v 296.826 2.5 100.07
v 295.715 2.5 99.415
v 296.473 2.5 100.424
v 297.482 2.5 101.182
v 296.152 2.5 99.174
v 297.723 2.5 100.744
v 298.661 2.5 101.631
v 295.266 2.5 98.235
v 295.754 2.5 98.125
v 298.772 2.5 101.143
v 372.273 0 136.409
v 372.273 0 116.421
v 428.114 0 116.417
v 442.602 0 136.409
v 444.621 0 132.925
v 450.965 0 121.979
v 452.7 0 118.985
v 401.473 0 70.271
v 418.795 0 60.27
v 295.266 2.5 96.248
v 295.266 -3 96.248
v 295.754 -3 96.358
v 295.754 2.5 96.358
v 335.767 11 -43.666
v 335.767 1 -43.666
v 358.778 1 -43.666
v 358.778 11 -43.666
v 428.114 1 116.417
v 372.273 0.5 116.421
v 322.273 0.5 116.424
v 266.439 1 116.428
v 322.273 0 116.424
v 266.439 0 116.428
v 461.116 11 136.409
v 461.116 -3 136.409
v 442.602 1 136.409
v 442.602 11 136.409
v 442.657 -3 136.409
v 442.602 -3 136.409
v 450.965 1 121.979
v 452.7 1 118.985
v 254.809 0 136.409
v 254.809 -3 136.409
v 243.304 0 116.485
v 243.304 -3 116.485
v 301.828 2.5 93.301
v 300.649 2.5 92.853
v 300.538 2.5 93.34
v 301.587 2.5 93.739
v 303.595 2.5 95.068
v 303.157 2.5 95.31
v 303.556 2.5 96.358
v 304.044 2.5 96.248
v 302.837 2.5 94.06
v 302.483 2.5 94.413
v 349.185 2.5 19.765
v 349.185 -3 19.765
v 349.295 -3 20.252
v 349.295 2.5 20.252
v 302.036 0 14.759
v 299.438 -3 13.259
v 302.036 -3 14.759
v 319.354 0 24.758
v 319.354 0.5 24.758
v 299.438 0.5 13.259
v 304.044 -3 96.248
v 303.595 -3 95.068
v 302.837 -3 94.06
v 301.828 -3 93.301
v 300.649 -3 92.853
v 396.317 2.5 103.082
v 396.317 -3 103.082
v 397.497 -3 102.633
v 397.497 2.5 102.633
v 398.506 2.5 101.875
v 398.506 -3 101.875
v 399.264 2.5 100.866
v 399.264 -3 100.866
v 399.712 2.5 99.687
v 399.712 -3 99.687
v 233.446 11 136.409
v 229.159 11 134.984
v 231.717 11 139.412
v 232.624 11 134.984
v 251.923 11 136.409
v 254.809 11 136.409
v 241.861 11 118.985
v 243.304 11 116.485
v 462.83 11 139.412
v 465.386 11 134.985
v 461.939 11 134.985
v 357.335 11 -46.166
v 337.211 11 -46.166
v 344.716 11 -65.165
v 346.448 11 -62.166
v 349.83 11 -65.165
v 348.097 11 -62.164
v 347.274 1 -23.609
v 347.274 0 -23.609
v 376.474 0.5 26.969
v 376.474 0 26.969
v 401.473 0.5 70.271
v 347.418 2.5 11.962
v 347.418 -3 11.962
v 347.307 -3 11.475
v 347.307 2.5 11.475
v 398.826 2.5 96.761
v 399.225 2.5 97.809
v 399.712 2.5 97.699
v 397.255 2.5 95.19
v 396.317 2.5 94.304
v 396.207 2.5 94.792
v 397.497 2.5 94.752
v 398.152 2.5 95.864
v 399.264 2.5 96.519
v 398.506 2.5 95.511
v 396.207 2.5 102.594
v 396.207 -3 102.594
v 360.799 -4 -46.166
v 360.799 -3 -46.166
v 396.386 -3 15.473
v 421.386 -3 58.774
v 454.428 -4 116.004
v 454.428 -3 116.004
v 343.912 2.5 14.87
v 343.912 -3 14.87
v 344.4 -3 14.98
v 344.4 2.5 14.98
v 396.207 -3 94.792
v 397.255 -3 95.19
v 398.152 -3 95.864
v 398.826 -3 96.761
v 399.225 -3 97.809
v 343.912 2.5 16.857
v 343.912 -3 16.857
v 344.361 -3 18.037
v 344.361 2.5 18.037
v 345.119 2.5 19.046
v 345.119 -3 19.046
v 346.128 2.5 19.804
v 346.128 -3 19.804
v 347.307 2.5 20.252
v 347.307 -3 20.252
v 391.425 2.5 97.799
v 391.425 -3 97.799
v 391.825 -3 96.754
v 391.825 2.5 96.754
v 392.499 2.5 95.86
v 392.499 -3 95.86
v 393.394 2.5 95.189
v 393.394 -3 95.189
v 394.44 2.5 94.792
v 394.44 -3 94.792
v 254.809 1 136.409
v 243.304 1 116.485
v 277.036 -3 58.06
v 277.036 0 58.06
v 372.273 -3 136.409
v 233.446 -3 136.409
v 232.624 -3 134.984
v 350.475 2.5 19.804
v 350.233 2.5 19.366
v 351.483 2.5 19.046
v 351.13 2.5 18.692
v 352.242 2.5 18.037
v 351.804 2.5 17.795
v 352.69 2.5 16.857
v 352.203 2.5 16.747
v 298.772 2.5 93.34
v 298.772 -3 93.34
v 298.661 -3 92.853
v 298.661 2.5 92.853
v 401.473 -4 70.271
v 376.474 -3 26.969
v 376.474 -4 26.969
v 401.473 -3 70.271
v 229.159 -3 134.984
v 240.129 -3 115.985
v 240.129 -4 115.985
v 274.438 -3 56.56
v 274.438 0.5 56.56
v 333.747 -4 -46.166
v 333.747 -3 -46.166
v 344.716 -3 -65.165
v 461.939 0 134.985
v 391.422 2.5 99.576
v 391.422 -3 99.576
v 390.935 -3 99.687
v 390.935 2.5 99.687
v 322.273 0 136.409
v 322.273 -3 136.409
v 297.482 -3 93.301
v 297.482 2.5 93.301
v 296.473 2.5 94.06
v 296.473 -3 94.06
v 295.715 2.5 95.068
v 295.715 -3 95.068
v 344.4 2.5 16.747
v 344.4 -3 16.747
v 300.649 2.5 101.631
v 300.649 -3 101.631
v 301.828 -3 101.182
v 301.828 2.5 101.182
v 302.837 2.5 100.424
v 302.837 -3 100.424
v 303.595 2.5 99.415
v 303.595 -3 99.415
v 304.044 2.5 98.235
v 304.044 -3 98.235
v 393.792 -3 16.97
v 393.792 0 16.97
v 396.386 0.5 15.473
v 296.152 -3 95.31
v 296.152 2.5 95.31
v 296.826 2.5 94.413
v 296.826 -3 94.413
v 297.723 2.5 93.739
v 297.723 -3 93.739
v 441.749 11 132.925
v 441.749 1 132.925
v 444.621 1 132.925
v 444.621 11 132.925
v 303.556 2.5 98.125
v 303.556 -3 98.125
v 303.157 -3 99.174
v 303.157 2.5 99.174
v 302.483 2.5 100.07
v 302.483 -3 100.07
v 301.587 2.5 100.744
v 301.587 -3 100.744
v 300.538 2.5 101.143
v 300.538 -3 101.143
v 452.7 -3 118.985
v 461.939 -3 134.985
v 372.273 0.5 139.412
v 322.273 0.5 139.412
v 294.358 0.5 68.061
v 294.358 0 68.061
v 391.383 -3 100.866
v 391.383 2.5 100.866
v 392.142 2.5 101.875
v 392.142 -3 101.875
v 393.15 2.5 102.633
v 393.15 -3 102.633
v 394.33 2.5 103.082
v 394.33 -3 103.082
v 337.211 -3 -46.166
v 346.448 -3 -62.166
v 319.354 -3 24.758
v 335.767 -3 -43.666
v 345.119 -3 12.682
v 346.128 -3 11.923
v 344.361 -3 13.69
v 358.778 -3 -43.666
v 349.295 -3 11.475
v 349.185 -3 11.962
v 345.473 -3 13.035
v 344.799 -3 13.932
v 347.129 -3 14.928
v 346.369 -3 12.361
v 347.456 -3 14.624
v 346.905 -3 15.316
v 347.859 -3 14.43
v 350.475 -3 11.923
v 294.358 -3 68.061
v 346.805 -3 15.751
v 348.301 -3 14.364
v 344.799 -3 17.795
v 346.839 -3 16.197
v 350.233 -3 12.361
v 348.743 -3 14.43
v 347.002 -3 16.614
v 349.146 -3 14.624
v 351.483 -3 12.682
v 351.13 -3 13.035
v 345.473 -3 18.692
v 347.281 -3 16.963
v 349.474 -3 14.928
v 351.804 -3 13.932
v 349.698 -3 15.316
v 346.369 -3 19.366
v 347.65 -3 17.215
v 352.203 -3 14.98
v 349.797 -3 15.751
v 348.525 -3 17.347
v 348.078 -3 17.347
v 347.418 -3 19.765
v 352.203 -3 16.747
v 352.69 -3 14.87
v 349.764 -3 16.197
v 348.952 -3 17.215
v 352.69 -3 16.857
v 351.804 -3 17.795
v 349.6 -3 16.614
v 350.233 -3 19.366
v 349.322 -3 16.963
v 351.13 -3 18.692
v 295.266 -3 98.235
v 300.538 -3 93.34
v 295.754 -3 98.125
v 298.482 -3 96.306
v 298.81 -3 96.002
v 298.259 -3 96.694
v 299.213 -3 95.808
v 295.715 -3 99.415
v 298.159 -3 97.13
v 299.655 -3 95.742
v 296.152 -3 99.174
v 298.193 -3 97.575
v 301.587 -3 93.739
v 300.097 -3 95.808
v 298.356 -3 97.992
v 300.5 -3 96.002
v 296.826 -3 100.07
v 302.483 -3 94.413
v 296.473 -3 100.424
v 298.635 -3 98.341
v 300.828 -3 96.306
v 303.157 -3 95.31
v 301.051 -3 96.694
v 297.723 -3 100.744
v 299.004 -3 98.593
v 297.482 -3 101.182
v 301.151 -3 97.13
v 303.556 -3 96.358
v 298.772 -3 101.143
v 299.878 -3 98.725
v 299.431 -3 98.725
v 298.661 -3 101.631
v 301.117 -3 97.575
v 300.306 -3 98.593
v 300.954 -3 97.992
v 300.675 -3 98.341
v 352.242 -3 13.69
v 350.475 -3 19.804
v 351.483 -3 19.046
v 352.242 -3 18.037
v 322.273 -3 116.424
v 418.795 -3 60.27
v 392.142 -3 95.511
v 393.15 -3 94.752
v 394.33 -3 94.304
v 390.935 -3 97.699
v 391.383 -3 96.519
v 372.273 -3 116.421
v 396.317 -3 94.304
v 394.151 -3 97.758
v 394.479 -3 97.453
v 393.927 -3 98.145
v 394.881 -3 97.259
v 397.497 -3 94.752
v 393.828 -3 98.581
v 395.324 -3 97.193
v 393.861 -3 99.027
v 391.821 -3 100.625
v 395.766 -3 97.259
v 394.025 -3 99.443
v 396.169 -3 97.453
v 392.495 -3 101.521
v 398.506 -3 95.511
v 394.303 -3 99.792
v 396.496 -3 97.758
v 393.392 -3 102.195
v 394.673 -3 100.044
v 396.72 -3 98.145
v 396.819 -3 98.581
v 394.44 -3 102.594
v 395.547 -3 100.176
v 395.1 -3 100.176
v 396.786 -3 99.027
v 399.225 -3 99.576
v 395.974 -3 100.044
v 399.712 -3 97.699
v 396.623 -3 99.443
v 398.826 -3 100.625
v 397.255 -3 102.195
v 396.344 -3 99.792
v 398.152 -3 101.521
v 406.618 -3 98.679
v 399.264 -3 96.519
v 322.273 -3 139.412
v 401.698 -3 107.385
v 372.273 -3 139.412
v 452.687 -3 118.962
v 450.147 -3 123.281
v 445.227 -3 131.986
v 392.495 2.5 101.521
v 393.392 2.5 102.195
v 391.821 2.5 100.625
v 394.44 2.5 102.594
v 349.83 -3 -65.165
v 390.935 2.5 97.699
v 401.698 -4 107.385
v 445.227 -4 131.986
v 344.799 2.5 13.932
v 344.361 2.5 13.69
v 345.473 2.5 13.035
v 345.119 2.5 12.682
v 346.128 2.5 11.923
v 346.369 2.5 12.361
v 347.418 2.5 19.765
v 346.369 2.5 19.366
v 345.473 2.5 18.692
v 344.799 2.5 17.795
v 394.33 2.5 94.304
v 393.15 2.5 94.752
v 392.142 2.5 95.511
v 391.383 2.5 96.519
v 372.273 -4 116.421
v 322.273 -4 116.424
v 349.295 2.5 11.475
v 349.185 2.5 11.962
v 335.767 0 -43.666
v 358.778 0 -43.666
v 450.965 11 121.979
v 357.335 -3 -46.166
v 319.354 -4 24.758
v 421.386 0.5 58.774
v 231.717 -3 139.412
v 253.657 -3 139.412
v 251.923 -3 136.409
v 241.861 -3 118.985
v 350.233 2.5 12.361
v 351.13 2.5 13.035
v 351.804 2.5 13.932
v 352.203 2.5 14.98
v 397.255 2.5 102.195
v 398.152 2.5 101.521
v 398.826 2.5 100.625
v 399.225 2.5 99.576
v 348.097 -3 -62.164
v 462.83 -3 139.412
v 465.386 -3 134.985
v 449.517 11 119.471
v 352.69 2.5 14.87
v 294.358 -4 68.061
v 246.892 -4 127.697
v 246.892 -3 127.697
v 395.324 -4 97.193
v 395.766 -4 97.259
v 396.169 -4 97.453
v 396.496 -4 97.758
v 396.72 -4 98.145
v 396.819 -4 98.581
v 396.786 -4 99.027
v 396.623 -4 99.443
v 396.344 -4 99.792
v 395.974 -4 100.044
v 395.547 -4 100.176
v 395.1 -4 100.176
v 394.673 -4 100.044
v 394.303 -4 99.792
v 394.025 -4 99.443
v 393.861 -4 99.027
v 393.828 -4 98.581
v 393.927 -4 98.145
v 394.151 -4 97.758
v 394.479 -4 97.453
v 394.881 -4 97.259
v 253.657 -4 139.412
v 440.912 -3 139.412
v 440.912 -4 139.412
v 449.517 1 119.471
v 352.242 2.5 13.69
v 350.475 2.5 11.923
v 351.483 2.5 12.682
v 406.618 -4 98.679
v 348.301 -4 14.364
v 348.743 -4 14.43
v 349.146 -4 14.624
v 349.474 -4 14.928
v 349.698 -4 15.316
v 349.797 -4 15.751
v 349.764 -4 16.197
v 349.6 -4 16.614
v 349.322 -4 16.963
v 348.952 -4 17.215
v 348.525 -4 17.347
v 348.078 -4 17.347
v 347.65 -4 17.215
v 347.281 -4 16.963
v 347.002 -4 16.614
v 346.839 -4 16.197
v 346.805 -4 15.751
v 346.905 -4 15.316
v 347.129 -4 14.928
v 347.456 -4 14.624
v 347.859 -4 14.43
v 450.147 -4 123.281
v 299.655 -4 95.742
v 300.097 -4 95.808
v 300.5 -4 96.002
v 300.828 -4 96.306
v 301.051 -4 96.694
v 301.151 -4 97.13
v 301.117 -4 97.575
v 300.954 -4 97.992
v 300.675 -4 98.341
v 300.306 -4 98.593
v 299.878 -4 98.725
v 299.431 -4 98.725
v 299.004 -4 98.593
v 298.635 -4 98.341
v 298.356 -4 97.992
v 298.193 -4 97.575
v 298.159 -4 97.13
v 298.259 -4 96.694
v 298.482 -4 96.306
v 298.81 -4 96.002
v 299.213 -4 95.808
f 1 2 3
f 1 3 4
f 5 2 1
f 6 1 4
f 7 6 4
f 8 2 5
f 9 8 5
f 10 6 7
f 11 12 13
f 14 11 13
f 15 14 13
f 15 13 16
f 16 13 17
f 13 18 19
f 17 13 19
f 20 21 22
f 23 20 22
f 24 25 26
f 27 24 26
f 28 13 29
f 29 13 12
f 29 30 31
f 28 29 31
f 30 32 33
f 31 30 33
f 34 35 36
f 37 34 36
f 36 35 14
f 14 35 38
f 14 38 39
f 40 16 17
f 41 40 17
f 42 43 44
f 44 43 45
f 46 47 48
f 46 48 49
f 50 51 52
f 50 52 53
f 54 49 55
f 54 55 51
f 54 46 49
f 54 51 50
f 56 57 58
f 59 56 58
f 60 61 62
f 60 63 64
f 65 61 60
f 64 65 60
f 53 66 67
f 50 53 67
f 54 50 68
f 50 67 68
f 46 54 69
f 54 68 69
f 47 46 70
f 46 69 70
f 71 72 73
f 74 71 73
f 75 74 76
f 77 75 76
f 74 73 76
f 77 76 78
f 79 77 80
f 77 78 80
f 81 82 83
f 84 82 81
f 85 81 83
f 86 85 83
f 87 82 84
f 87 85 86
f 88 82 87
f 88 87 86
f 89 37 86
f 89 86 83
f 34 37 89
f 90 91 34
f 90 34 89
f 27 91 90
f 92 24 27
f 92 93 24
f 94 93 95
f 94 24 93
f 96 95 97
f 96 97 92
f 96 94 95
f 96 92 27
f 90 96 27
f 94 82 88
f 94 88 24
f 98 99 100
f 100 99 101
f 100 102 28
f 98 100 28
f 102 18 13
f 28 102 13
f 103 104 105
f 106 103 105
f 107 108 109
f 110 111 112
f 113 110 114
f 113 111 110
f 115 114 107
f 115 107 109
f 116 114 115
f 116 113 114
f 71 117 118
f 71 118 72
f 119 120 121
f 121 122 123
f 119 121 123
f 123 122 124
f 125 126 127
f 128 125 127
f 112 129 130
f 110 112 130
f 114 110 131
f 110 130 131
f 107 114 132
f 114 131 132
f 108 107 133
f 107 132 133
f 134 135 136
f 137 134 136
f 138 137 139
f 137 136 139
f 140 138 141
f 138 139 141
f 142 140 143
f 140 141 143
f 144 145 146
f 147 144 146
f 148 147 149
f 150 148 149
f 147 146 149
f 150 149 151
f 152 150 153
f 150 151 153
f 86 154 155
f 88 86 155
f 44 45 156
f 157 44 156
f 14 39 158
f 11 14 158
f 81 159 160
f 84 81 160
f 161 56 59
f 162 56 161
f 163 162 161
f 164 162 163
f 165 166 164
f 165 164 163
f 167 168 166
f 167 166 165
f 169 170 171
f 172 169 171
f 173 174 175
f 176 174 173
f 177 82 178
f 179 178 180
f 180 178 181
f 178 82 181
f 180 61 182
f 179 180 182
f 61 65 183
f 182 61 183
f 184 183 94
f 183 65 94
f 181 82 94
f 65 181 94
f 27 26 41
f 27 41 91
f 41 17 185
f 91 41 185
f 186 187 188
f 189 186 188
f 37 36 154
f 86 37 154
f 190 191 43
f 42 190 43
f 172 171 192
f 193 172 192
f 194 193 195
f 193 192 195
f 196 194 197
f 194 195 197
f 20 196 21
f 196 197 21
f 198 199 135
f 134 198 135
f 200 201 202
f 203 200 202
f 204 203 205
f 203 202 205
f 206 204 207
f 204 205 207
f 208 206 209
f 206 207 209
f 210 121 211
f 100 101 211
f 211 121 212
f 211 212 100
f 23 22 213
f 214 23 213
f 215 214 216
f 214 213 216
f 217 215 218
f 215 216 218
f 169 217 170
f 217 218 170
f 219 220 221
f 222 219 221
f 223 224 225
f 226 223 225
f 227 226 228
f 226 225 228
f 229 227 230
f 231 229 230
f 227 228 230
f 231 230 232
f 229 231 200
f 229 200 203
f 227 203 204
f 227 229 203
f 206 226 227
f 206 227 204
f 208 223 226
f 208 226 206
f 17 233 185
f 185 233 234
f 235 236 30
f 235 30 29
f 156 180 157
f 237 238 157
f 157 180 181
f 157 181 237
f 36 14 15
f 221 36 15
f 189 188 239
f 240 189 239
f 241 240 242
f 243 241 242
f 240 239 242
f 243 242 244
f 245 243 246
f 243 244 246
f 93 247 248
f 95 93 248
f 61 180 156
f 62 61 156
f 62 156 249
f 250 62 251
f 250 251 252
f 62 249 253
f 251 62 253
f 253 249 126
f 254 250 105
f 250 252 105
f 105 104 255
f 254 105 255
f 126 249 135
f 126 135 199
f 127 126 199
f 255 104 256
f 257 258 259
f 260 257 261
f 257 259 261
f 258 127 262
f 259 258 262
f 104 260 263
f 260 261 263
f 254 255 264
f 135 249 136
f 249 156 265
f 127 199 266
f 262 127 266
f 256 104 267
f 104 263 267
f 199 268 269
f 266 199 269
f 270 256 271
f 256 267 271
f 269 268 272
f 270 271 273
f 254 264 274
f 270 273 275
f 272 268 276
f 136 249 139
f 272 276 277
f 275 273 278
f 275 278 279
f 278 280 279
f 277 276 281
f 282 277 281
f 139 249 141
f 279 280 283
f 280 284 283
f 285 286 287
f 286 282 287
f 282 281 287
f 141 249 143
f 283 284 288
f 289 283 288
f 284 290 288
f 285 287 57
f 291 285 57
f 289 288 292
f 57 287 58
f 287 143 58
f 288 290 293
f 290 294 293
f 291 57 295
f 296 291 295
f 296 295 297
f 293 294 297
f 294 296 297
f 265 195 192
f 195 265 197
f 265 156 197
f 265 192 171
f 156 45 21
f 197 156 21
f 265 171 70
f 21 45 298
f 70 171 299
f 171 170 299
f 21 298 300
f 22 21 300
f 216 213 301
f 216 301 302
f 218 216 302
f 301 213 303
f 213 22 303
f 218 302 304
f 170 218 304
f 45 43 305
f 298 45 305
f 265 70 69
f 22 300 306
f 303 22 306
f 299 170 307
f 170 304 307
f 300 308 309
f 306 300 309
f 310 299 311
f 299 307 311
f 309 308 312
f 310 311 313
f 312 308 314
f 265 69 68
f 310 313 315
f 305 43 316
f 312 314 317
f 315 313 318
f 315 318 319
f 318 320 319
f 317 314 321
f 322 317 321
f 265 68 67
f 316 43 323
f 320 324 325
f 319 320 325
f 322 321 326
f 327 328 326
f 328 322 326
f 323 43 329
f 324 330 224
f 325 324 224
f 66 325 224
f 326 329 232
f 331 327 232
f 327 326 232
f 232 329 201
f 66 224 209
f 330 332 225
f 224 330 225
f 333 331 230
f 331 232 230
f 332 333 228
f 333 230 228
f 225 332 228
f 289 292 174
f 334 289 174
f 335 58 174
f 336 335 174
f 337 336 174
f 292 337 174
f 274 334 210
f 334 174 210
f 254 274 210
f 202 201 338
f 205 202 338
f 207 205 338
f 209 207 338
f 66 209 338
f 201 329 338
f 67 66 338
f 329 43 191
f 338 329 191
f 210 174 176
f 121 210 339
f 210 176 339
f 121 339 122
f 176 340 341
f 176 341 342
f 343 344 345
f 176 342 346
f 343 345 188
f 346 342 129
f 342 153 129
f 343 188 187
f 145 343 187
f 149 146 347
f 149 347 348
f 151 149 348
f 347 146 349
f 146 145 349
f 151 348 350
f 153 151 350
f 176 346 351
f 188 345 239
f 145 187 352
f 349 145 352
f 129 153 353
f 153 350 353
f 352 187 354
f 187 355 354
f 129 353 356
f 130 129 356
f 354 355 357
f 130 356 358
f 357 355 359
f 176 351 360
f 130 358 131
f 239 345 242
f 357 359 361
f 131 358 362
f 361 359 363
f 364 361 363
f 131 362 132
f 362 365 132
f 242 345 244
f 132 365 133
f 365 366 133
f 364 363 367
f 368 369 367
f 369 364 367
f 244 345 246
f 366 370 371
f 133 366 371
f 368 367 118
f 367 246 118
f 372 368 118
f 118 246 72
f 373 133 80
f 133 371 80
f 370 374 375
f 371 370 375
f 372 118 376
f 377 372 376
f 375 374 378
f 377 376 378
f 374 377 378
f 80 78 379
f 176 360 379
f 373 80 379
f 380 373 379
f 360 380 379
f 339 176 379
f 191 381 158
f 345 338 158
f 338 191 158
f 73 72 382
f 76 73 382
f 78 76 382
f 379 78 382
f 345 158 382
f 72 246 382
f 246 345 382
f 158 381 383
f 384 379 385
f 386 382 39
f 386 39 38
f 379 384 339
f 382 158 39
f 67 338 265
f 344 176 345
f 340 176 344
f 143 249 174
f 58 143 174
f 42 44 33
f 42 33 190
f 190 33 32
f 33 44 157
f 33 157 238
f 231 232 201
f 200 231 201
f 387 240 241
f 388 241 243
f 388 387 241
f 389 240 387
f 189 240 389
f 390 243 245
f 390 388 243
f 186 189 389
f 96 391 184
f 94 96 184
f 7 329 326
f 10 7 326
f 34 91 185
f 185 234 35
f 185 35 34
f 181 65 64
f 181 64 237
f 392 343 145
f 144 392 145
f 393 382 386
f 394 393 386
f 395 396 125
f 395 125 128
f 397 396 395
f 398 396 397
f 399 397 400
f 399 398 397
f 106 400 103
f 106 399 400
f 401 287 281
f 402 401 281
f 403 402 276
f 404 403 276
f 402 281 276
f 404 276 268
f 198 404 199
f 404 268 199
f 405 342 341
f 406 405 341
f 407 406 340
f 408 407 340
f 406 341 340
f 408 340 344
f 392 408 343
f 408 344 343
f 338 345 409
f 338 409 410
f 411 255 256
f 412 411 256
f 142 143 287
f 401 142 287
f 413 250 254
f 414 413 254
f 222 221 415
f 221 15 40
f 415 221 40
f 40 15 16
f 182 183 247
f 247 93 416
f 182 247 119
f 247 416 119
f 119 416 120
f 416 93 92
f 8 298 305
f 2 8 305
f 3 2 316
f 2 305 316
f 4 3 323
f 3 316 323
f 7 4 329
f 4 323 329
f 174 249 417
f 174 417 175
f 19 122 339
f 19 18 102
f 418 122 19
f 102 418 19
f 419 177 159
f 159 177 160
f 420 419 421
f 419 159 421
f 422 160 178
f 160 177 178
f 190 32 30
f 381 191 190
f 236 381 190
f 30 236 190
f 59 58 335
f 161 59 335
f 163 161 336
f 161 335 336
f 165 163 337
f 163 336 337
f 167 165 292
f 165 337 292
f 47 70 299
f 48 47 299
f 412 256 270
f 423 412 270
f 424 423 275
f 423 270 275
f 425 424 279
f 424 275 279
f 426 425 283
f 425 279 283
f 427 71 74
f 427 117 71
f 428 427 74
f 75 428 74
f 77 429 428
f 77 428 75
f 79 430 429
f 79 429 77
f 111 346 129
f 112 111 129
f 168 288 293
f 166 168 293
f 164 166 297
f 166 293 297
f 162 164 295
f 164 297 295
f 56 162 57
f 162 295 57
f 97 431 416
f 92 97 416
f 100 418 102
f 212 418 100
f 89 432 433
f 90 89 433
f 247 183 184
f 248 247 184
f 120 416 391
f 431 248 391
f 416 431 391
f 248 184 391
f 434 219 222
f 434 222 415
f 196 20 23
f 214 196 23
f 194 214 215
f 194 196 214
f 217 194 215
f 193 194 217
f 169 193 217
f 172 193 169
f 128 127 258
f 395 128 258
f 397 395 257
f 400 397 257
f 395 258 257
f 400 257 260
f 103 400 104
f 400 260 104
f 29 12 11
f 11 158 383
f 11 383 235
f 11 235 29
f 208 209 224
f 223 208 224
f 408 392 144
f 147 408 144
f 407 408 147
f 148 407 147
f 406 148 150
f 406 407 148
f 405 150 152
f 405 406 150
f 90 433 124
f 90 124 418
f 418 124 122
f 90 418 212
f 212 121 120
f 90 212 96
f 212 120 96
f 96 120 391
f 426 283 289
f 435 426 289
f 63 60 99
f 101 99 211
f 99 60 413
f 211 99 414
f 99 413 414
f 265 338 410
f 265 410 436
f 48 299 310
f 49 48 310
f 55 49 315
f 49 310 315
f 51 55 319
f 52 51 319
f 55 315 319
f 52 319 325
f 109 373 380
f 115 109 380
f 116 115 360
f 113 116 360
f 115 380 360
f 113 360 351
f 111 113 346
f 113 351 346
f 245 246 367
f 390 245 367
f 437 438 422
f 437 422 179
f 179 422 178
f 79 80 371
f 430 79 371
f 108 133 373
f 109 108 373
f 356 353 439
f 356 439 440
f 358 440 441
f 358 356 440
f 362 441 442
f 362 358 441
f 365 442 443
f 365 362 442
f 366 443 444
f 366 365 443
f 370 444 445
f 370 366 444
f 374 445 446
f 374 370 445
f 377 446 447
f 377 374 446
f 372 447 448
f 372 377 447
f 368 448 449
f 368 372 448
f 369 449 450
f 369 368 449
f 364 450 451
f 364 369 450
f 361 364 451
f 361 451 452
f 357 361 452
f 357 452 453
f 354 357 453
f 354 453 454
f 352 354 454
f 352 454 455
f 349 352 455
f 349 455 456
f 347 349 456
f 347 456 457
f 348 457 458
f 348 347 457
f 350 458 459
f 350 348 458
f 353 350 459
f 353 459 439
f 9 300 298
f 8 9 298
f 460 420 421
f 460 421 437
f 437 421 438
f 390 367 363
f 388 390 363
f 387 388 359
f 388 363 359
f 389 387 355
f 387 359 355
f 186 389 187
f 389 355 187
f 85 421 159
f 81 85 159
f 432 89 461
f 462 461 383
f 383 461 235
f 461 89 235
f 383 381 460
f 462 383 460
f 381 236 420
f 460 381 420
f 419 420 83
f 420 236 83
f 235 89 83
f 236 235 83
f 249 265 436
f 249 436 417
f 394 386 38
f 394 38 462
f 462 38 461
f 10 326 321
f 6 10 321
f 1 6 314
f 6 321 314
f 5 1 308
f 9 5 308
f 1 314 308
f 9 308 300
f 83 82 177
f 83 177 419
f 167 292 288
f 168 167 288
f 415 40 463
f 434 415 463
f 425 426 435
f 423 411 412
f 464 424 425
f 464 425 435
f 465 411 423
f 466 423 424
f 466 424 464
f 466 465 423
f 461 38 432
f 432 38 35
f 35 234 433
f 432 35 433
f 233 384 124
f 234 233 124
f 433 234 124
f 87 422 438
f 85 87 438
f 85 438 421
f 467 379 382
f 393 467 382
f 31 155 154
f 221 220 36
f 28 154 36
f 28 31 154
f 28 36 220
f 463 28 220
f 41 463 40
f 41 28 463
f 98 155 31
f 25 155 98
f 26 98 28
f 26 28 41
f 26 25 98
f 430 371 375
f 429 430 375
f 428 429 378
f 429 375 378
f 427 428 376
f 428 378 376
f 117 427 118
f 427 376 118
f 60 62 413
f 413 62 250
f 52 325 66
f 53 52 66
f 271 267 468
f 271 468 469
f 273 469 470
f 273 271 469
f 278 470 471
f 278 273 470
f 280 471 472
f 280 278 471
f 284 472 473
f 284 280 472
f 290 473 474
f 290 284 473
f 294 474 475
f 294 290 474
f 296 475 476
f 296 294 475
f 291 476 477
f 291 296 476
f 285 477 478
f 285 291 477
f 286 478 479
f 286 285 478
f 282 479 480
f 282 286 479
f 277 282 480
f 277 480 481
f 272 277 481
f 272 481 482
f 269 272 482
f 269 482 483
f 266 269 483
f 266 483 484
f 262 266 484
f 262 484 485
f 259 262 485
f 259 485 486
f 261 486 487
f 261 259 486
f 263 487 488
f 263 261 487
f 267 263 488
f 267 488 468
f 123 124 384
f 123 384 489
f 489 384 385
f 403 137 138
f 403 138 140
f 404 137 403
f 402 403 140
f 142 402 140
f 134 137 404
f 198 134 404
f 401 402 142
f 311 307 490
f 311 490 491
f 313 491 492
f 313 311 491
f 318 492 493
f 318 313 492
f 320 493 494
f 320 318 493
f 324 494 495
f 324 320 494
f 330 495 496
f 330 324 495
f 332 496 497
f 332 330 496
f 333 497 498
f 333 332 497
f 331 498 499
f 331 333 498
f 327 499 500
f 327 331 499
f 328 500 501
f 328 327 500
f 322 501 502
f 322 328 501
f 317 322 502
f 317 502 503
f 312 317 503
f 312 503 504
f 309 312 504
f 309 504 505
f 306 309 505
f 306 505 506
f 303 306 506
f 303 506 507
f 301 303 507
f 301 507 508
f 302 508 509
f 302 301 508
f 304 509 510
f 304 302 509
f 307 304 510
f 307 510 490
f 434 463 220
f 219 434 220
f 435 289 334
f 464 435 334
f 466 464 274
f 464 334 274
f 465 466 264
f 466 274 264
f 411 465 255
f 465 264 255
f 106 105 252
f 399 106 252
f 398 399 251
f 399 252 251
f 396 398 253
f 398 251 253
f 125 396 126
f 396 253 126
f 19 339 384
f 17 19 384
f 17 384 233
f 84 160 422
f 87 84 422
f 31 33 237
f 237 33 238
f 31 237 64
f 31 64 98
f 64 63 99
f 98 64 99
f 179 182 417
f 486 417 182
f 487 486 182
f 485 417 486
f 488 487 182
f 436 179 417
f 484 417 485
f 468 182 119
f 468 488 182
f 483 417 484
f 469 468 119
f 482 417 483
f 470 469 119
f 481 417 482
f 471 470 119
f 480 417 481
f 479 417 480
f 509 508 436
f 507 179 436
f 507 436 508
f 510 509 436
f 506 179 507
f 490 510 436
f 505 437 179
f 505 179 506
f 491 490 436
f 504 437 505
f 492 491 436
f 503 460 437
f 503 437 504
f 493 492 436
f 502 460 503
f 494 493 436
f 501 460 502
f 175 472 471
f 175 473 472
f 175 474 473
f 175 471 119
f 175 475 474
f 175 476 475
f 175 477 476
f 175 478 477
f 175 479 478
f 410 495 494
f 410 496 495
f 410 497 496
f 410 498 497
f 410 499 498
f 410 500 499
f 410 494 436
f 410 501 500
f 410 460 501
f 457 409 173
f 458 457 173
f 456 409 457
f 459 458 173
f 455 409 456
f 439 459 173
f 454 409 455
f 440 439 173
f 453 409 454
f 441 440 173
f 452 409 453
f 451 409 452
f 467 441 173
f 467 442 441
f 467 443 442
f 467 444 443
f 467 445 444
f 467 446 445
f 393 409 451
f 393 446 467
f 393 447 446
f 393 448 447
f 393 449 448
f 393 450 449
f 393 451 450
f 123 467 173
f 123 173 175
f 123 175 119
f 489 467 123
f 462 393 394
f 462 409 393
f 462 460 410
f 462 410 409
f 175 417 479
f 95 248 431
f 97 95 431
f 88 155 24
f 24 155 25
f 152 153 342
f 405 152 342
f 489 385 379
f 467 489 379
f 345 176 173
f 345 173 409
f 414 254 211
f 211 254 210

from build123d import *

# Parameters (mm, degrees)
BOSS_EXTRUDE1_DEPTH      = 1
BOSS_EXTRUDE2_DEPTH      = 11
BOSS_EXTRUDE3_DEPTH      = 5
BOSS_EXTRUDE3_DEPTH_BACK = 3
SKETCH3_W                = 50
SKETCH3_H                = 7
CUT_EXTRUDE3_DEPTH       = 25
SKETCH5_W                = 50
SKETCH5_H                = 7
CUT_EXTRUDE4_DEPTH       = 25
SKETCH6_W                = 50
SKETCH6_H                = 7
CUT_EXTRUDE5_DEPTH       = 25
SKETCH8_R                = 1.5
BOSS_EXTRUDE5_DEPTH      = 1
BOSS_EXTRUDE10_DEPTH     = 5.5


with BuildPart() as part:
    # Sketch1 → Boss-Extrude1 (new body)
    with BuildSketch(Plane(origin=(0, 0, 0), x_dir=(1, 0, 0), z_dir=(0, 1, 0))):
        Polygon((243.304219773, -116.484791866), (254.809280576, -136.408896139), (442.602090749, -136.409305398), (444.621046679, -132.925433223), (441.749040748, -132.925433223), (449.516726723, -119.471406457), (450.964695297, -121.978953122), (452.699916621, -118.984688017), (358.778179035, 43.666038066), (335.767496284, 43.666038066), align=None)
        Polygon((428.113670919, -116.417164681), (266.439108268, -116.428009241), (347.273609729, 23.609230825), align=None, mode=Mode.SUBTRACT)
    extrude(amount=BOSS_EXTRUDE1_DEPTH)

    # Sketch1<9> → Boss-Extrude2 (add)
    # profile 1 of 2: a face of its own
    with BuildSketch(Plane(origin=(0, 0, 0), x_dir=(1, 0, 0), z_dir=(0, 1, 0))):
        Polygon((229.159432547, -134.984249184), (231.716666588, -139.412373829), (462.829865412, -139.412373829), (465.38624875, -134.984588004), (349.829542096, 65.165499075), (344.716133219, 65.165499075), align=None)
        Polygon((251.922647988, -136.4093054), (233.446303399, -136.408896139), (232.623553959, -134.984217358), (241.860901688, -118.984688019), align=None, mode=Mode.SUBTRACT)
        Polygon((442.602090749, -136.409305398), (254.809280576, -136.408896139), (243.304219773, -116.484791866), (335.767496284, 43.666038066), (358.778179035, 43.666038066), (461.938967957, -134.984588004), (461.116393748, -136.409305398), align=None, mode=Mode.SUBTRACT)
        Polygon((348.096628302, 62.164013367), (357.334800991, 46.166038067), (337.210874326, 46.166038067), (346.44844193, 62.165948237), align=None, mode=Mode.SUBTRACT)
    # profile 2 of 2: a face of its own
    with BuildSketch(Plane(origin=(0, 0, 0), x_dir=(1, 0, 0), z_dir=(0, 1, 0))):
        Polygon((441.749040748, -132.925433223), (444.621046679, -132.925433223), (450.964695297, -121.978953122), (449.516726723, -119.471406457), align=None)
    extrude(amount=BOSS_EXTRUDE2_DEPTH)

    # Sketch1<10> → Boss-Extrude3 (add, two sides: drawn at the far end of the back side and taken through both)
    with BuildSketch(Plane(origin=(0, 0, 0), x_dir=(1, 0, 0), z_dir=(0, 1, 0)).offset(-BOSS_EXTRUDE3_DEPTH_BACK)):
        Polygon((229.159432547, -134.984249184), (231.716666588, -139.412373829), (462.829865412, -139.412373829), (465.38624875, -134.984588004), (349.829542096, 65.165499075), (344.716133219, 65.165499075), align=None)
        Polygon((251.922647988, -136.4093054), (233.446303399, -136.408896139), (232.623553959, -134.984217358), (241.860901688, -118.984688019), align=None, mode=Mode.SUBTRACT)
        Polygon((442.602090749, -136.409305398), (254.809280576, -136.408896139), (243.304219773, -116.484791866), (335.767496284, 43.666038066), (358.778179035, 43.666038066), (452.699916621, -118.984688017), (461.938967957, -134.984588004), (461.116393748, -136.409305398), align=None, mode=Mode.SUBTRACT)
        Polygon((348.096628302, 62.164013367), (357.334800991, 46.166038067), (337.210874326, 46.166038067), (346.44844193, 62.165948237), align=None, mode=Mode.SUBTRACT)
    extrude(amount=BOSS_EXTRUDE3_DEPTH + BOSS_EXTRUDE3_DEPTH_BACK)

    # Sketch3 → Cut-Extrude3 (cut)
    with BuildSketch(Plane(origin=(290.589645397, 0, -167.772009994), x_dir=(-0.49999999999998745, 0, -0.8660254037844459), z_dir=(0.8660254037844459, 0, -0.49999999999998745))):
        with Locations((-236.592990632, -3)):
            Rectangle(SKETCH3_W, SKETCH3_H)
    extrude(amount=-CUT_EXTRUDE3_DEPTH, mode=Mode.SUBTRACT)

    # Sketch5 → Cut-Extrude4 (cut)
    with BuildSketch(Plane.XY.offset(139.412373829)):
        with Locations((347.273266, -3)):
            Rectangle(SKETCH5_W, SKETCH5_H)
    extrude(amount=-CUT_EXTRUDE4_DEPTH, mode=Mode.SUBTRACT)

    # Sketch6 → Cut-Extrude5 (cut)
    with BuildSketch(Plane(origin=(230.319375797, 0, 132.975171838), x_dir=(-0.5000006154012504, 0, 0.8660250484820695), z_dir=(-0.8660250484820695, 0, -0.5000006154012504))):
        with Locations((-113.2366748, -3)):
            Rectangle(SKETCH6_W, SKETCH6_H)
    extrude(amount=-CUT_EXTRUDE5_DEPTH, mode=Mode.SUBTRACT)

    # Sketch8 → Boss-Extrude5 (add)
    with BuildSketch(Plane.XZ.offset(3)):
        Polygon((246.891774838, 127.696996709), (240.128710529, 115.984933576), (333.74677129, -46.166038067), (360.798886024, -46.166038067), (454.427535986, 116.00354071), (450.14703547, 123.280701064), (406.618322212, 98.678849058), (401.697951811, 107.384591709), (445.226665069, 131.986443715), (440.912417704, 139.412373829), (253.656752788, 139.412373829), align=None)
        with Locations((395.323540807, 98.692824234)):
            Circle(SKETCH8_R, mode=Mode.SUBTRACT)
        with Locations((348.301285092, 15.863526629)):
            Circle(SKETCH8_R, mode=Mode.SUBTRACT)
        with Locations((299.654911442, 97.241681781)):
            Circle(SKETCH8_R, mode=Mode.SUBTRACT)
        Polygon((322.273266, 116.424264082), (294.358218631, 68.061097964), (319.354499366, 24.757680453), (376.473657317, 26.969372805), (401.47267951, 70.271207531), (372.273266, 116.420910258), align=None, mode=Mode.SUBTRACT)
    extrude(amount=BOSS_EXTRUDE5_DEPTH)

    # Sketch12 → Boss-Extrude10 (add)
    with BuildSketch(Plane(origin=(0, -3, 0), x_dir=(1, 0, 0), z_dir=(0, 1, 0))):
        with BuildLine():
            ThreePointArc((352.69017398, -14.869718639), (351.483265607, -12.681546113), (349.295093082, -11.47463774))
            Line((349.295093082, -11.47463774), (349.184669972, -11.962292061))
            ThreePointArc((349.184669972, -11.962292061), (351.129712216, -13.035099504), (352.202519659, -14.980141749))
            Line((352.202519659, -14.980141749), (352.69017398, -14.869718639))
        make_face()
        with BuildLine():
            Line((347.417900212, -11.962292061), (347.307477102, -11.47463774))
            ThreePointArc((347.307477102, -11.47463774), (345.119304576, -12.681546113), (343.912396203, -14.869718639))
            Line((343.912396203, -14.869718639), (344.400050524, -14.980141749))
            ThreePointArc((344.400050524, -14.980141749), (345.472857967, -13.035099504), (347.417900212, -11.962292061))
        make_face()
        with BuildLine():
            ThreePointArc((349.295093082, -20.252415518), (351.483265607, -19.045507144), (352.69017398, -16.857334619))
            Line((352.69017398, -16.857334619), (352.202519659, -16.746911509))
            ThreePointArc((352.202519659, -16.746911509), (351.129712216, -18.691953754), (349.184669972, -19.764761197))
            Line((349.184669972, -19.764761197), (349.295093082, -20.252415518))
        make_face()
        with BuildLine():
            Line((344.400050524, -16.746911509), (343.912396203, -16.857334619))
            ThreePointArc((343.912396203, -16.857334619), (345.119304576, -19.045507144), (347.307477102, -20.252415518))
            Line((347.307477102, -20.252415518), (347.417900212, -19.764761197))
            ThreePointArc((347.417900212, -19.764761197), (345.472857967, -18.691953754), (344.400050524, -16.746911509))
        make_face()
        with BuildLine():
            Line((394.440155927, -94.791589666), (394.329732817, -94.303935345))
            ThreePointArc((394.329732817, -94.303935345), (392.141560292, -95.510843719), (390.934651919, -97.699016244))
            Line((390.934651919, -97.699016244), (391.4247896, -97.798542945))
            ThreePointArc((391.4247896, -97.798542945), (392.499067689, -95.860448622), (394.440155927, -94.791589666))
        make_face()
        with BuildLine():
            ThreePointArc((399.712429696, -97.699016244), (398.505521323, -95.510843719), (396.317348797, -94.303935345))
            Line((396.317348797, -94.303935345), (396.206925687, -94.791589666))
            ThreePointArc((396.206925687, -94.791589666), (398.151967932, -95.864397109), (399.224775375, -97.809439354))
            Line((399.224775375, -97.809439354), (399.712429696, -97.699016244))
        make_face()
        with BuildLine():
            Line((391.422306239, -99.576209114), (390.934651919, -99.686632224))
            ThreePointArc((390.934651919, -99.686632224), (392.141560292, -101.874804749), (394.329732817, -103.081713123))
            Line((394.329732817, -103.081713123), (394.440155927, -102.594058802))
            ThreePointArc((394.440155927, -102.594058802), (392.495113683, -101.521251359), (391.422306239, -99.576209114))
        make_face()
        with BuildLine():
            ThreePointArc((396.317348797, -103.081713123), (398.505521323, -101.874804749), (399.712429696, -99.686632224))
            Line((399.712429696, -99.686632224), (399.224775375, -99.576209114))
            ThreePointArc((399.224775375, -99.576209114), (398.151967932, -101.521251359), (396.206925687, -102.594058802))
            Line((396.206925687, -102.594058802), (396.317348797, -103.081713123))
        make_face()
        with BuildLine():
            ThreePointArc((298.661103452, -92.852792892), (296.472930927, -94.059701266), (295.266022553, -96.247873791))
            Line((295.266022553, -96.247873791), (295.753676874, -96.358296901))
            ThreePointArc((295.753676874, -96.358296901), (296.826484317, -94.413254657), (298.771526562, -93.340447213))
            Line((298.771526562, -93.340447213), (298.661103452, -92.852792892))
        make_face()
        with BuildLine():
            Line((295.753676874, -98.125066661), (295.266022553, -98.235489771))
            ThreePointArc((295.266022553, -98.235489771), (296.472930927, -100.423662297), (298.661103452, -101.63057067))
            Line((298.661103452, -101.63057067), (298.771526562, -101.142916349))
            ThreePointArc((298.771526562, -101.142916349), (296.826484317, -100.070108906), (295.753676874, -98.125066661))
        make_face()
        with BuildLine():
            ThreePointArc((304.043800331, -96.247873791), (302.836891957, -94.059701266), (300.648719432, -92.852792892))
            Line((300.648719432, -92.852792892), (300.538296322, -93.340447213))
            ThreePointArc((300.538296322, -93.340447213), (302.483338567, -94.413254657), (303.55614601, -96.358296901))
            Line((303.55614601, -96.358296901), (304.043800331, -96.247873791))
        make_face()
        with BuildLine():
            Line((300.538296322, -101.142916349), (300.648719432, -101.63057067))
            ThreePointArc((300.648719432, -101.63057067), (302.836891957, -100.423662297), (304.043800331, -98.235489771))
            Line((304.043800331, -98.235489771), (303.55614601, -98.125066661))
            ThreePointArc((303.55614601, -98.125066661), (302.483338567, -100.070108906), (300.538296322, -101.142916349))
        make_face()
    extrude(amount=BOSS_EXTRUDE10_DEPTH)


solid = part.part
